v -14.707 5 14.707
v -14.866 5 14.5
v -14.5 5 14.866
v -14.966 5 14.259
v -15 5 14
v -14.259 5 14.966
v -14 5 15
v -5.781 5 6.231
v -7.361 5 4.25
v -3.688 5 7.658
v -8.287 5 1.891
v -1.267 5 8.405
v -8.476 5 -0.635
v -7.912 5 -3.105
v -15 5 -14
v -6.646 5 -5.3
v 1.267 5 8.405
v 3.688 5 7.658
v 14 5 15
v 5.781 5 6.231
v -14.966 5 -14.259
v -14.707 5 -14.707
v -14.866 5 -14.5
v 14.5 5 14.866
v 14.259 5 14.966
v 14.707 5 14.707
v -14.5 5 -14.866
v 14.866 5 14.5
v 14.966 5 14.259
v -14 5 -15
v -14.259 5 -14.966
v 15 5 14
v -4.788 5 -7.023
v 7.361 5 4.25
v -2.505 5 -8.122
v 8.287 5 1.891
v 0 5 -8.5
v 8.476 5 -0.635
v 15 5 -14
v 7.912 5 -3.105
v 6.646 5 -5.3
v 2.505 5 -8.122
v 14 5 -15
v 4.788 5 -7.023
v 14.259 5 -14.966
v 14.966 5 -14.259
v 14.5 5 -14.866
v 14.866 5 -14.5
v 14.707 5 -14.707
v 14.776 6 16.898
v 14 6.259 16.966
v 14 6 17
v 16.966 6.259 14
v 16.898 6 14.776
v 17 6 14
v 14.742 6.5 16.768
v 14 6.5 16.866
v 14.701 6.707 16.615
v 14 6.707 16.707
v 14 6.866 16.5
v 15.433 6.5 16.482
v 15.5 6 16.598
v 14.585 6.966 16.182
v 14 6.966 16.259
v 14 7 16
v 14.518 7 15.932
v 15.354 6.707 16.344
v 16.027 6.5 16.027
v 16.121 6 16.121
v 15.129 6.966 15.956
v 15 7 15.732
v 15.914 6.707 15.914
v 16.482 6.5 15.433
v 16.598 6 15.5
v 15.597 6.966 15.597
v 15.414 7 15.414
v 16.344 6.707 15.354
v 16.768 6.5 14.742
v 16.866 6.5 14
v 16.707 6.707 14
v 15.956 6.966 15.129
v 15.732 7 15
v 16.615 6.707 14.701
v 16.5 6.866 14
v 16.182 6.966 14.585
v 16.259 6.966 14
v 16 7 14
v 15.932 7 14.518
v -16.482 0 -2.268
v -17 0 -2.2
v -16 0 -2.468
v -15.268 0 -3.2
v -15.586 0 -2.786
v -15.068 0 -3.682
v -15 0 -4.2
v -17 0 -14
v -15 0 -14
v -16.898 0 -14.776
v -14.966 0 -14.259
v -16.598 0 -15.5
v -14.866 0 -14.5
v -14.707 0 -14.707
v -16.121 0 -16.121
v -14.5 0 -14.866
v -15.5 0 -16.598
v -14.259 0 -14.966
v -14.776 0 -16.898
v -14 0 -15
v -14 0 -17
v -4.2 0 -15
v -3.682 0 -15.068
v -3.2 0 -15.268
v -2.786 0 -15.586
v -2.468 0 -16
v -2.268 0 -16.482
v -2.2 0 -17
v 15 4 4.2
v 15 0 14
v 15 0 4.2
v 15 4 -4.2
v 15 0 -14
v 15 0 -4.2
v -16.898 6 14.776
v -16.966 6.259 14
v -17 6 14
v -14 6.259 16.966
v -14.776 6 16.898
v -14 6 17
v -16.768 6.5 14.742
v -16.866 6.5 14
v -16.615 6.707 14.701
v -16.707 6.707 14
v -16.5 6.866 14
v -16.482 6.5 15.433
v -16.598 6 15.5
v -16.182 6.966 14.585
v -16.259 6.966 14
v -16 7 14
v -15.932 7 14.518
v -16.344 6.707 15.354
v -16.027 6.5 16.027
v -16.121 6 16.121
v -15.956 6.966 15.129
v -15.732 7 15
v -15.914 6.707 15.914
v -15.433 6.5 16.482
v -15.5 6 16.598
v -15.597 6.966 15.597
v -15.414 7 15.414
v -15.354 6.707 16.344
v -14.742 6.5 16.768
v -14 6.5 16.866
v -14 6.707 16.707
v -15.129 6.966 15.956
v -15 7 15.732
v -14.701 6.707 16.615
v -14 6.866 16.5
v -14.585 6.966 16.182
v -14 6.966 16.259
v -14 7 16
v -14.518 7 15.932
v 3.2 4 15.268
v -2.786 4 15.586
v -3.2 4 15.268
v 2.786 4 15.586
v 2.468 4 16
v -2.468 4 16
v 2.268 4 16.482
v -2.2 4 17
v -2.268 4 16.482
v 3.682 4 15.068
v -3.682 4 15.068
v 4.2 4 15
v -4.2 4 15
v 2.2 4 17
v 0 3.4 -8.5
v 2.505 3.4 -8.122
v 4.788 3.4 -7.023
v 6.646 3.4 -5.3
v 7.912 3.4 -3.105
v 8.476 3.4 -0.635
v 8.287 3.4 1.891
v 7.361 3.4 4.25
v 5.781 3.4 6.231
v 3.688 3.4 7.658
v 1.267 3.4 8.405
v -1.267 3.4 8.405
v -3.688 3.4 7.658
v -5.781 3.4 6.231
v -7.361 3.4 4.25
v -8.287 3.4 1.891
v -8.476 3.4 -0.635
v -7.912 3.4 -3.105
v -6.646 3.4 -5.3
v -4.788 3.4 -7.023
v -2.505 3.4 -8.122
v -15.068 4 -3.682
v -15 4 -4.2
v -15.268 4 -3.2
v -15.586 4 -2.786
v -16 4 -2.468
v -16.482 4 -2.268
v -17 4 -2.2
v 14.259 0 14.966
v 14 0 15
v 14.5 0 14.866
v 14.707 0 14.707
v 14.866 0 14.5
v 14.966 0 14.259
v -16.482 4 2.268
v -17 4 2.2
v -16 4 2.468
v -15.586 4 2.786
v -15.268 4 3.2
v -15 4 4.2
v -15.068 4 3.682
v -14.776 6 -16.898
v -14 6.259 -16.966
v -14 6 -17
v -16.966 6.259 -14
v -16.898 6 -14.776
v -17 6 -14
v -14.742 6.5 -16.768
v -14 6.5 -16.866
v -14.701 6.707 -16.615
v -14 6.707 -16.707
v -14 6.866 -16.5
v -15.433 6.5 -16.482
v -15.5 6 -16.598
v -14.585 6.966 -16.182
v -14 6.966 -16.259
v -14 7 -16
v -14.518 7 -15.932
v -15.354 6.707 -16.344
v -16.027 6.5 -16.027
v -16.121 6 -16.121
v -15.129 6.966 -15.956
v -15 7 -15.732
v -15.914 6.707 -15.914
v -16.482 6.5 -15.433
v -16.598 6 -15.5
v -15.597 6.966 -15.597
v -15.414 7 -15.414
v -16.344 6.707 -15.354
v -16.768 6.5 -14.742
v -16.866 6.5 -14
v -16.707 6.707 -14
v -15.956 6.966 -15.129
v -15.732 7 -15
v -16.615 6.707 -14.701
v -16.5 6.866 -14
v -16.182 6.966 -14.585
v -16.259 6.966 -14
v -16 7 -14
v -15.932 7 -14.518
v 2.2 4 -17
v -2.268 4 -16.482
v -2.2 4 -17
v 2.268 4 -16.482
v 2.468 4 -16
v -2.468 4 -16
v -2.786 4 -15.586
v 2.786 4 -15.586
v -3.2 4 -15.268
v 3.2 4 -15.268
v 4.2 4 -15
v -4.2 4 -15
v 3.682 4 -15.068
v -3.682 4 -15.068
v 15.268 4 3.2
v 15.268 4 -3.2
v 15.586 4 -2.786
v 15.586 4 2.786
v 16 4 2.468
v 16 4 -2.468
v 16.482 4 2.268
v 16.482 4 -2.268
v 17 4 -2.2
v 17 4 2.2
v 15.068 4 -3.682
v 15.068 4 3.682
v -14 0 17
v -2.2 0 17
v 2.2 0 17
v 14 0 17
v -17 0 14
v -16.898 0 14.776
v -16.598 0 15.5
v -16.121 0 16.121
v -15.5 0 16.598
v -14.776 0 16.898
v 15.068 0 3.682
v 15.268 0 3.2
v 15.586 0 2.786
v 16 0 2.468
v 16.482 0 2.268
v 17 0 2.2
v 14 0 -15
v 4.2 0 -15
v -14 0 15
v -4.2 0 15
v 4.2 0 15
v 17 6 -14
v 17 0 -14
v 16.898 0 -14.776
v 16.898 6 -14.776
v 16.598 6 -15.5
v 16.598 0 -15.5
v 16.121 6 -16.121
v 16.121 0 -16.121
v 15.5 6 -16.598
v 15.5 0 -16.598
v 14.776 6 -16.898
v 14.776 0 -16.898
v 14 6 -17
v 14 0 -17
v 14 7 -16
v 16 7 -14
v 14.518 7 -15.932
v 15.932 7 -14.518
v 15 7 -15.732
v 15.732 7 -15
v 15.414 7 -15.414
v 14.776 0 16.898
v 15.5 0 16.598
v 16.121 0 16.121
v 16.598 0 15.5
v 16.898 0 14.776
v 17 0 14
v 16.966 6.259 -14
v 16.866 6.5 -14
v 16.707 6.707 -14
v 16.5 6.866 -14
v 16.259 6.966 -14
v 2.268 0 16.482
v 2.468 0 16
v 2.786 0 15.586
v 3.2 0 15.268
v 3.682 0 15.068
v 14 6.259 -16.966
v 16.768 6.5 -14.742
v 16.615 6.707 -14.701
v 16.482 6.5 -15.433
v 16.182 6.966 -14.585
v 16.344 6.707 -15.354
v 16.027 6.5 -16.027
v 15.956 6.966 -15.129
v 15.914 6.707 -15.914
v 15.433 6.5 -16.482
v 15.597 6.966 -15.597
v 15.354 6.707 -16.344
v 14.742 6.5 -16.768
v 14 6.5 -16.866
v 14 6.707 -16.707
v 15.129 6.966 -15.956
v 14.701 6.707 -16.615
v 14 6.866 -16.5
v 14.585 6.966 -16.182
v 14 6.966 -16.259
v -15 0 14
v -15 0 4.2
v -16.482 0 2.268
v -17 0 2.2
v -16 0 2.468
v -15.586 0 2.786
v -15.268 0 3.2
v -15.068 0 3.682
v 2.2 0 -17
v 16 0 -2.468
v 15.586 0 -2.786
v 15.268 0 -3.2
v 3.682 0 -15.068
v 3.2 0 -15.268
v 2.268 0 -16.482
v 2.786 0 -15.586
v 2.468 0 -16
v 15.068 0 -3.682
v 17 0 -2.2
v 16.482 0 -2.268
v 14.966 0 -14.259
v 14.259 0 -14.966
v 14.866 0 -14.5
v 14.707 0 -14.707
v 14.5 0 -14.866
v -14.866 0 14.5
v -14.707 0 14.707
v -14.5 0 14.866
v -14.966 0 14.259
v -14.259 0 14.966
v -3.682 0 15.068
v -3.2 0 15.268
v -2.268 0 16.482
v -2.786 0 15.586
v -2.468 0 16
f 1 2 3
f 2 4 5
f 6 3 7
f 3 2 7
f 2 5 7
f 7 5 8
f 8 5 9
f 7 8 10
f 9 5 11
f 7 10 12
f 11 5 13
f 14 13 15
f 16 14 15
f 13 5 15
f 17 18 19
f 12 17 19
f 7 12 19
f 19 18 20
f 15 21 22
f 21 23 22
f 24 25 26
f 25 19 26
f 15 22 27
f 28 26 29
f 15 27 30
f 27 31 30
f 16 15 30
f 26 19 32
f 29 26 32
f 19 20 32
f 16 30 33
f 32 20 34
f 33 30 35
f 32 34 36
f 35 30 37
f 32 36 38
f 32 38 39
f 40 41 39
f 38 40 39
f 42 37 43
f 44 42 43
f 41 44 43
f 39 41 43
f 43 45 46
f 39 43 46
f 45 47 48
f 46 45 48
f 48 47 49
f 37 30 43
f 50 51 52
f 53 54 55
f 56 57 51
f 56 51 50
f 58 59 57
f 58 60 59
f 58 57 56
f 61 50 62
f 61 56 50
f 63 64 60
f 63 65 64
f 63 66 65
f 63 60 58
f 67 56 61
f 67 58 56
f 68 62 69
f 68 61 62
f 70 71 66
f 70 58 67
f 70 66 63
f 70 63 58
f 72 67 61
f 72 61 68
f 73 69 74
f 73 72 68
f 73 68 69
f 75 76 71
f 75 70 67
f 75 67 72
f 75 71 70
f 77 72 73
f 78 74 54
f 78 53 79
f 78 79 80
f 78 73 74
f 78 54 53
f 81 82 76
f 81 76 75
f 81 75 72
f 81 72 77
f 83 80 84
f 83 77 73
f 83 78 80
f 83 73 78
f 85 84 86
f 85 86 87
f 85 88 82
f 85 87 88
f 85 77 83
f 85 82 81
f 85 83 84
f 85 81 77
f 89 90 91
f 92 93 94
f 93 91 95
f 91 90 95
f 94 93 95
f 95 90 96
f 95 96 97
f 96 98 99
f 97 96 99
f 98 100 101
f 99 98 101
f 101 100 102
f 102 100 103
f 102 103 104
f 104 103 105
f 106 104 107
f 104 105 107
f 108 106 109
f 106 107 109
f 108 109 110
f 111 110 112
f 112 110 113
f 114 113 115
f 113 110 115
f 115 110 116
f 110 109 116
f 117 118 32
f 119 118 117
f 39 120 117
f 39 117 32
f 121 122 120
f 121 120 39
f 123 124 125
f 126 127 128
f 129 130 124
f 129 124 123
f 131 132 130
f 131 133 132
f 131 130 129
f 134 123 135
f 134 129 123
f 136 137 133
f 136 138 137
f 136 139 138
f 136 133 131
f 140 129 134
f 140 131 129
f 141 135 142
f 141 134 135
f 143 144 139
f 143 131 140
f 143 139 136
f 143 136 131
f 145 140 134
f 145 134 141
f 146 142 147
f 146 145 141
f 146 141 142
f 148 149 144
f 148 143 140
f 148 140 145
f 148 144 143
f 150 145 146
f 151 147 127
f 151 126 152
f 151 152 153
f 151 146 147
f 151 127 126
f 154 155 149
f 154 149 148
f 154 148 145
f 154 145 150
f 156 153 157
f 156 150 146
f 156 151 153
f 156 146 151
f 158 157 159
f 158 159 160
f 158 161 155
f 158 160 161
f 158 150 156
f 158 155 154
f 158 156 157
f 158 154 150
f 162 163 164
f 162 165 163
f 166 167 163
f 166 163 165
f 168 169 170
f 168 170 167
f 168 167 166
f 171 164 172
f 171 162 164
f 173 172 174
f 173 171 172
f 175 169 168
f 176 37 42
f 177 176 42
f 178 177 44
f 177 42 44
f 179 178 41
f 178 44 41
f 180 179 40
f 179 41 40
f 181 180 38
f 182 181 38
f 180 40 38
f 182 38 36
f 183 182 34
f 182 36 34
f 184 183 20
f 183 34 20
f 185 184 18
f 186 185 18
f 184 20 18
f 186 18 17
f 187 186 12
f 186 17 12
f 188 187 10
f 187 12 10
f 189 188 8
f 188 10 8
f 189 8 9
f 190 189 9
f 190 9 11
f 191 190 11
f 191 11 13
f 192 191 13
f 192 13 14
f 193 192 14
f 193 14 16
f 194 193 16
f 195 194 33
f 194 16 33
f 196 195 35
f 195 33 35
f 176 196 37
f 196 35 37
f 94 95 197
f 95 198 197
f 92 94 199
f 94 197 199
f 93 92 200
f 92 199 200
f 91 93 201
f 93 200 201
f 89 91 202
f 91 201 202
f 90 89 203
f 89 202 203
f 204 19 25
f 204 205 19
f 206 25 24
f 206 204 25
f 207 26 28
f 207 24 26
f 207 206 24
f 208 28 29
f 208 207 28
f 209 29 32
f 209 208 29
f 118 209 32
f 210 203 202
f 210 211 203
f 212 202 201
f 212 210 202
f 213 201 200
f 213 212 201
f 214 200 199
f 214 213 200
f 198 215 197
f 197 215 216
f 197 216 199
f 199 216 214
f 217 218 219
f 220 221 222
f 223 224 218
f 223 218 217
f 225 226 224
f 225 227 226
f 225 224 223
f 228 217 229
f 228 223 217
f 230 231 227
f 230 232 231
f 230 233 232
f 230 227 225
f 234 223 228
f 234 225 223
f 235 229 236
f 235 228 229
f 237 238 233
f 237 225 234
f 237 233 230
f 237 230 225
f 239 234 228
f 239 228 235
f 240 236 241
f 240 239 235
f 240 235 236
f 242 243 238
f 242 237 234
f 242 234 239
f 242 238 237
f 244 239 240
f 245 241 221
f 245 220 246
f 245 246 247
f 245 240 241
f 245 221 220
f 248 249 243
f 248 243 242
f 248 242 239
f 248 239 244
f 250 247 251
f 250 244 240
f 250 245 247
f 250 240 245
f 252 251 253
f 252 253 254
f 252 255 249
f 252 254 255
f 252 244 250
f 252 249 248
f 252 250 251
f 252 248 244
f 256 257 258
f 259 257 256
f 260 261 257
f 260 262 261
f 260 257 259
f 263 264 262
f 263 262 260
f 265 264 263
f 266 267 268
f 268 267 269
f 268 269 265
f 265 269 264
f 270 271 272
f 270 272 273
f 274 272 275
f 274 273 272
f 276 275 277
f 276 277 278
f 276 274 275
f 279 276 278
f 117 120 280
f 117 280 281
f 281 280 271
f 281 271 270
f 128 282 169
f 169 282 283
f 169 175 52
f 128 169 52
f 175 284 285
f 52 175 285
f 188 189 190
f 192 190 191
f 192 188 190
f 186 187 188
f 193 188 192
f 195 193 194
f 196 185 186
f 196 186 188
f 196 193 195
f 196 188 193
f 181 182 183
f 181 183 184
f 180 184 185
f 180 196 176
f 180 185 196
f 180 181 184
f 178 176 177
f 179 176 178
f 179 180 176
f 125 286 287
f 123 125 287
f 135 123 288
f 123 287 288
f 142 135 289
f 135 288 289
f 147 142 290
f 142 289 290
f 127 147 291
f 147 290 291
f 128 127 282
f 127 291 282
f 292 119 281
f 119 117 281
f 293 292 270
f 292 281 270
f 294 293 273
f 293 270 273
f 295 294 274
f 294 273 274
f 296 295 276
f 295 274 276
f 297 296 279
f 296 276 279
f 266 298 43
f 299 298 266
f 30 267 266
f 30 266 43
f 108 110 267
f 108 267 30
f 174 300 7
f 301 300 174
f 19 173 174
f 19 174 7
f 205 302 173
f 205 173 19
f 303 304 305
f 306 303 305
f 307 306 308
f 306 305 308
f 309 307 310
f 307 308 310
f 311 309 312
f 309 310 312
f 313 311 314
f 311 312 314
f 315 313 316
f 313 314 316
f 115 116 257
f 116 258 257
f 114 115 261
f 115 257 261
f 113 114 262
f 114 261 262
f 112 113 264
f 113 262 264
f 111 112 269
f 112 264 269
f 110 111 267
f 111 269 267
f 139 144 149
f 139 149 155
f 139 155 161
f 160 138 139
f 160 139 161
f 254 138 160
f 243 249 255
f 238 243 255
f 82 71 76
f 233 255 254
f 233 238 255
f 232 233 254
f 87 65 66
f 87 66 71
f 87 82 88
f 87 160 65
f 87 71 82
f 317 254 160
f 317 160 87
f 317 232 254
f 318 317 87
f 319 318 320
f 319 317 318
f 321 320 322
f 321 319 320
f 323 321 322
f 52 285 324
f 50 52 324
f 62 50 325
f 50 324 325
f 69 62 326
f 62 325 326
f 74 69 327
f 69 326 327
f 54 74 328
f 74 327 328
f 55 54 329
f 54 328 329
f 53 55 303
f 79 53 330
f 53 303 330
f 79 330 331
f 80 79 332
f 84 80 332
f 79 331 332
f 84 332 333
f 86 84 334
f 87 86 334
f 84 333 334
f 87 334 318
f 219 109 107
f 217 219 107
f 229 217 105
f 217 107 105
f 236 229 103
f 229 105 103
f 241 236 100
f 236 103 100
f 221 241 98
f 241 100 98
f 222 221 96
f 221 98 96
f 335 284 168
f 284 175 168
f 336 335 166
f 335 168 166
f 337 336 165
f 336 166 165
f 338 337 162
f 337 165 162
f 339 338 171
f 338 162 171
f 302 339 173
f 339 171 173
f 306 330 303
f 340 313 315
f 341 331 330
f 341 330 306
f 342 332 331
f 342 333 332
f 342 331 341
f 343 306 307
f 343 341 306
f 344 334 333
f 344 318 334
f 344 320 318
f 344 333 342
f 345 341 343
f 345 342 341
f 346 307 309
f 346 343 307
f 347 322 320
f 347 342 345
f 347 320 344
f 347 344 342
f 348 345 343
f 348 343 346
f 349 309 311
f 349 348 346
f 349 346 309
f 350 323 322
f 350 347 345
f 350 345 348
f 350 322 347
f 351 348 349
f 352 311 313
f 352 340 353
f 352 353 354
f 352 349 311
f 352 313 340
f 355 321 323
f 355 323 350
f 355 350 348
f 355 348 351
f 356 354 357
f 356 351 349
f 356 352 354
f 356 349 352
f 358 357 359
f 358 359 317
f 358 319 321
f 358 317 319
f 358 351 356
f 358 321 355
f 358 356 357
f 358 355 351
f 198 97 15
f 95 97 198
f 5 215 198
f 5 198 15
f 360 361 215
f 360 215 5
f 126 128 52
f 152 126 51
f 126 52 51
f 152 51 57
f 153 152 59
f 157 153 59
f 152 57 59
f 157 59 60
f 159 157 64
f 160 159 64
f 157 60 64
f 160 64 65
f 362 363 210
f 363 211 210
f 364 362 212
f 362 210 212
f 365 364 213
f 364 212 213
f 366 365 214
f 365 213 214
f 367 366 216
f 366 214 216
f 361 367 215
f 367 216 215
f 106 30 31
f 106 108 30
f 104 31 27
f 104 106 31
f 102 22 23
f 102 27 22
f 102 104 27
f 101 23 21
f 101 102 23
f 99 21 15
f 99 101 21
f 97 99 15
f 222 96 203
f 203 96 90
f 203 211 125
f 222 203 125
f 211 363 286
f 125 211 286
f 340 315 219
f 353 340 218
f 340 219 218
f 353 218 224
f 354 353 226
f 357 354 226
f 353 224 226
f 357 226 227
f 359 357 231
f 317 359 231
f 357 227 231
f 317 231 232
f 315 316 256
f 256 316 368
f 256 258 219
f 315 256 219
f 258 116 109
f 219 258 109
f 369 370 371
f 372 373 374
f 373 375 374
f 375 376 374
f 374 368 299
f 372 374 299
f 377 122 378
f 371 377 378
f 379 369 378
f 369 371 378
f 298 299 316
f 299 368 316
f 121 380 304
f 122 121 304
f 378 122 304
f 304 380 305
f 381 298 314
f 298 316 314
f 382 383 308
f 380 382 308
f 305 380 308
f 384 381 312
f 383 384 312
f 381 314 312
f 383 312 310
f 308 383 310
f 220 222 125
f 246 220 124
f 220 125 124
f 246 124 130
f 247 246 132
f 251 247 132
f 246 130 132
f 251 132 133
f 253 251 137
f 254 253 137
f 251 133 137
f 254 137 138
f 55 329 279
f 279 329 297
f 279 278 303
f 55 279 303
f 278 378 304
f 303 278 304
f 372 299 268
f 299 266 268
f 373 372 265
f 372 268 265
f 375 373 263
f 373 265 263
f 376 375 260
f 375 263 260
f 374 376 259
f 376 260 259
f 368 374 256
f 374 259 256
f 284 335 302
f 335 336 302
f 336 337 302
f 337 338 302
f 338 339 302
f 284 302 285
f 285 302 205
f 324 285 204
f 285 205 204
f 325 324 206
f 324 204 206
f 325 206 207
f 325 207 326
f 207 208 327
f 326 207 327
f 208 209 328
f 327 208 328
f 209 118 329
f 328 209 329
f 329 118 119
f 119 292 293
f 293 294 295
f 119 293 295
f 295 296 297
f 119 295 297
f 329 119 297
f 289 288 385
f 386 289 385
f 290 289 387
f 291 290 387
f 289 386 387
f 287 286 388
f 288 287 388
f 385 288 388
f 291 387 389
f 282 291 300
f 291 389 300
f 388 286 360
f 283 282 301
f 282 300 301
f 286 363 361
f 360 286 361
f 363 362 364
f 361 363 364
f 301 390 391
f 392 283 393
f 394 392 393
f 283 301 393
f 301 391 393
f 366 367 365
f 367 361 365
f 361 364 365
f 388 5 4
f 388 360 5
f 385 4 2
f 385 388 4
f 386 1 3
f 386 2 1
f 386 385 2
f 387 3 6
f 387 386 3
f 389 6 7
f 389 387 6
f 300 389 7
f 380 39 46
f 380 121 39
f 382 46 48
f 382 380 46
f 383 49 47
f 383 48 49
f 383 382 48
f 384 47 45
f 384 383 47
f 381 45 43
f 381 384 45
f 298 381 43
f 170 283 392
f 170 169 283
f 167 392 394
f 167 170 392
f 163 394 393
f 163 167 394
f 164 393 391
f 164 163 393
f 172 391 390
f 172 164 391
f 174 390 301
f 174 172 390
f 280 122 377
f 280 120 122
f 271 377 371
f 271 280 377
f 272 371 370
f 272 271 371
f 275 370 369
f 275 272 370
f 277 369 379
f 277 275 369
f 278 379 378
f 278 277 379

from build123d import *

# Parameters (mm, degrees)
BOSS_EXTRUDE1_DEPTH = 7
SHELL1_T            = -2
FILLET1_R           = 1
SKETCH2_R           = 8.5
BOSS_EXTRUDE2_DEPTH = 1.6
SKETCH3_W           = 4.4
SKETCH3_H           = 2
SKETCH3_W_2         = 2
SKETCH3_H_2         = 4.4
CUT_EXTRUDE1_DEPTH  = 4
FILLET2_R           = 2


with BuildPart() as part:
    # Sketch1 → Boss-Extrude1 (new body)
    with BuildSketch(Plane(origin=(0, 0, 0), x_dir=(1, 0, 0), z_dir=(0, 1, 0))):
        with BuildLine():
            Line((-14, -17), (14, -17))
            ThreePointArc((14, -17), (16.121320344, -16.121320344), (17, -14))
            Line((17, -14), (17, 14))
            ThreePointArc((17, 14), (16.121320344, 16.121320344), (14, 17))
            Line((14, 17), (-14, 17))
            ThreePointArc((-14, 17), (-16.121320344, 16.121320344), (-17, 14))
            Line((-17, 14), (-17, -14))
            ThreePointArc((-17, -14), (-16.121320344, -16.121320344), (-14, -17))
        make_face()
    extrude(amount=BOSS_EXTRUDE1_DEPTH)

    # Shell1
    shell1_openings = [part.faces().sort_by_distance(p)[0] for p in [
        (0, 0, 0),
    ]]
    offset(amount=SHELL1_T, openings=shell1_openings, kind=Kind.INTERSECTION)

    # Fillet1
    fillet1_edges = [part.edges().sort_by_distance(p)[0] for p in [
        (16.121320344, 7, 16.121320344),
        (17, 7, 0),
        (16.121320344, 7, -16.121320344),
        (0, 7, -17),
        (-16.121320344, 7, -16.121320344),
        (-17, 7, 0),
        (-16.121320344, 7, 16.121320344),
        (0, 7, 17),
    ]]
    fillet(fillet1_edges, radius=FILLET1_R)

    # Sketch2 → Boss-Extrude2 (add)
    with BuildSketch(Plane.XZ.offset(-5)):
        with Locations(Location((0, 0, 0), (0, 0, 270))):
            Circle(SKETCH2_R)
    extrude(amount=BOSS_EXTRUDE2_DEPTH)

    # Sketch3 → Cut-Extrude1 (cut)
    with BuildSketch(Plane.XZ):
        with Locations((0, 16)):
            Rectangle(SKETCH3_W, SKETCH3_H)
        with Locations((-16, 0)):
            Rectangle(SKETCH3_W_2, SKETCH3_H_2)
        with Locations((0, -16)):
            Rectangle(SKETCH3_W, SKETCH3_H)
        with Locations((16, 0)):
            Rectangle(SKETCH3_W_2, SKETCH3_H_2)
    extrude(amount=-CUT_EXTRUDE1_DEPTH, mode=Mode.SUBTRACT)

    # Fillet2
    fillet2_edges = [part.edges().sort_by_distance(p)[0] for p in [
        (-15, 2, -2.2),
        (-15, 2, 2.2),
        (-2.2, 2, 15),
        (2.2, 2, 15),
        (15, 2, 2.2),
        (15, 2, -2.2),
        (2.2, 2, -15),
        (-2.2, 2, -15),
    ]]
    fillet(fillet2_edges, radius=FILLET2_R - 0.0001)  # a hair under: the kernel refuses the full size


solid = part.part
